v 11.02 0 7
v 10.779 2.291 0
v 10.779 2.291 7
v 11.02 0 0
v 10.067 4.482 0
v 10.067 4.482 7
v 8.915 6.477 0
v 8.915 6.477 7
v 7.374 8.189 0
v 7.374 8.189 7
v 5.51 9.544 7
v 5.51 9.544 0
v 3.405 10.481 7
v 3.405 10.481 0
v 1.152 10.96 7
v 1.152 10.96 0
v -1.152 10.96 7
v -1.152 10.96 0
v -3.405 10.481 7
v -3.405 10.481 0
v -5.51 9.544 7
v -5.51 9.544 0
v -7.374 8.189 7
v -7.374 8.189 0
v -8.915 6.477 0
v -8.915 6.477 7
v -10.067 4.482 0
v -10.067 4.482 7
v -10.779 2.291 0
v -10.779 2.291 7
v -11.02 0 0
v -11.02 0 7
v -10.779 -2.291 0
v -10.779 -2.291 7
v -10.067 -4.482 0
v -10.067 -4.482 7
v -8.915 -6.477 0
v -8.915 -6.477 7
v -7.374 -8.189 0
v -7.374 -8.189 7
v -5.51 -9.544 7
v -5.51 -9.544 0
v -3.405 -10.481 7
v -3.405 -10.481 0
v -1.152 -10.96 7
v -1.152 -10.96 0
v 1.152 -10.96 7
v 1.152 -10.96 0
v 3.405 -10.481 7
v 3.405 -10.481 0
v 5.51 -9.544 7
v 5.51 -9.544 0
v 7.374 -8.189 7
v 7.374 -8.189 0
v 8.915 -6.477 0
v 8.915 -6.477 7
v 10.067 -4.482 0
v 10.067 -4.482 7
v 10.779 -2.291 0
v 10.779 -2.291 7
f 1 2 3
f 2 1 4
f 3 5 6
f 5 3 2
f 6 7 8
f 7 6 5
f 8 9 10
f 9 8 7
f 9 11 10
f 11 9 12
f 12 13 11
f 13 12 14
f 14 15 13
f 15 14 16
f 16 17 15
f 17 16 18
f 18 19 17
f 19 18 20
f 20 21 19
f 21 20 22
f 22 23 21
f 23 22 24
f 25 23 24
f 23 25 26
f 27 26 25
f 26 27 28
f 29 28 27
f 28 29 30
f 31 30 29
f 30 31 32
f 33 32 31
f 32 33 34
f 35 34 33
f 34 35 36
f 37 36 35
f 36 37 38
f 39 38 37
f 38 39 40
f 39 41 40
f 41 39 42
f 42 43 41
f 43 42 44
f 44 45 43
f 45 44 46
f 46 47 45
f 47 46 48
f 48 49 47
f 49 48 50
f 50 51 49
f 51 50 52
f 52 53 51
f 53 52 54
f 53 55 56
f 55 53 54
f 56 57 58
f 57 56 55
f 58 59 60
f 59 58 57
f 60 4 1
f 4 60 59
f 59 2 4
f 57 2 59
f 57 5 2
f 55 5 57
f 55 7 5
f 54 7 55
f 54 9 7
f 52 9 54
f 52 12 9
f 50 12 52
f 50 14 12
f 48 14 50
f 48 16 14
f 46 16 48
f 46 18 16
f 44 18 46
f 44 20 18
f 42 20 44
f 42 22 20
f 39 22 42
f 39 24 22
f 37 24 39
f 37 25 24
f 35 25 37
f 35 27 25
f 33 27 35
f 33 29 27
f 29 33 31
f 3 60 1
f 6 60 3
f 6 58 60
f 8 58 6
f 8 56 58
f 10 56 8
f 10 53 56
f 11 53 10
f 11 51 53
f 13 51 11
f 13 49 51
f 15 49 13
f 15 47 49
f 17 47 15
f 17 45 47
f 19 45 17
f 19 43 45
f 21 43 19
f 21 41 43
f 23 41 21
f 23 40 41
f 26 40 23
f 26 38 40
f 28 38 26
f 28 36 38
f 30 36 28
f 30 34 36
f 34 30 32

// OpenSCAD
function BallBearingDiam() = 22;
function BallBearingHeight() = 7;
function BallBearingInnerDiam()= 8;


module BallBearing(3dPrinterTolerance=.04)
{
cylinder(BallBearingHeight(), (BallBearingDiam()+3dPrinterTolerance)/2, (BallBearingDiam()+3dPrinterTolerance)/2, 0);
}

BallBearing();
